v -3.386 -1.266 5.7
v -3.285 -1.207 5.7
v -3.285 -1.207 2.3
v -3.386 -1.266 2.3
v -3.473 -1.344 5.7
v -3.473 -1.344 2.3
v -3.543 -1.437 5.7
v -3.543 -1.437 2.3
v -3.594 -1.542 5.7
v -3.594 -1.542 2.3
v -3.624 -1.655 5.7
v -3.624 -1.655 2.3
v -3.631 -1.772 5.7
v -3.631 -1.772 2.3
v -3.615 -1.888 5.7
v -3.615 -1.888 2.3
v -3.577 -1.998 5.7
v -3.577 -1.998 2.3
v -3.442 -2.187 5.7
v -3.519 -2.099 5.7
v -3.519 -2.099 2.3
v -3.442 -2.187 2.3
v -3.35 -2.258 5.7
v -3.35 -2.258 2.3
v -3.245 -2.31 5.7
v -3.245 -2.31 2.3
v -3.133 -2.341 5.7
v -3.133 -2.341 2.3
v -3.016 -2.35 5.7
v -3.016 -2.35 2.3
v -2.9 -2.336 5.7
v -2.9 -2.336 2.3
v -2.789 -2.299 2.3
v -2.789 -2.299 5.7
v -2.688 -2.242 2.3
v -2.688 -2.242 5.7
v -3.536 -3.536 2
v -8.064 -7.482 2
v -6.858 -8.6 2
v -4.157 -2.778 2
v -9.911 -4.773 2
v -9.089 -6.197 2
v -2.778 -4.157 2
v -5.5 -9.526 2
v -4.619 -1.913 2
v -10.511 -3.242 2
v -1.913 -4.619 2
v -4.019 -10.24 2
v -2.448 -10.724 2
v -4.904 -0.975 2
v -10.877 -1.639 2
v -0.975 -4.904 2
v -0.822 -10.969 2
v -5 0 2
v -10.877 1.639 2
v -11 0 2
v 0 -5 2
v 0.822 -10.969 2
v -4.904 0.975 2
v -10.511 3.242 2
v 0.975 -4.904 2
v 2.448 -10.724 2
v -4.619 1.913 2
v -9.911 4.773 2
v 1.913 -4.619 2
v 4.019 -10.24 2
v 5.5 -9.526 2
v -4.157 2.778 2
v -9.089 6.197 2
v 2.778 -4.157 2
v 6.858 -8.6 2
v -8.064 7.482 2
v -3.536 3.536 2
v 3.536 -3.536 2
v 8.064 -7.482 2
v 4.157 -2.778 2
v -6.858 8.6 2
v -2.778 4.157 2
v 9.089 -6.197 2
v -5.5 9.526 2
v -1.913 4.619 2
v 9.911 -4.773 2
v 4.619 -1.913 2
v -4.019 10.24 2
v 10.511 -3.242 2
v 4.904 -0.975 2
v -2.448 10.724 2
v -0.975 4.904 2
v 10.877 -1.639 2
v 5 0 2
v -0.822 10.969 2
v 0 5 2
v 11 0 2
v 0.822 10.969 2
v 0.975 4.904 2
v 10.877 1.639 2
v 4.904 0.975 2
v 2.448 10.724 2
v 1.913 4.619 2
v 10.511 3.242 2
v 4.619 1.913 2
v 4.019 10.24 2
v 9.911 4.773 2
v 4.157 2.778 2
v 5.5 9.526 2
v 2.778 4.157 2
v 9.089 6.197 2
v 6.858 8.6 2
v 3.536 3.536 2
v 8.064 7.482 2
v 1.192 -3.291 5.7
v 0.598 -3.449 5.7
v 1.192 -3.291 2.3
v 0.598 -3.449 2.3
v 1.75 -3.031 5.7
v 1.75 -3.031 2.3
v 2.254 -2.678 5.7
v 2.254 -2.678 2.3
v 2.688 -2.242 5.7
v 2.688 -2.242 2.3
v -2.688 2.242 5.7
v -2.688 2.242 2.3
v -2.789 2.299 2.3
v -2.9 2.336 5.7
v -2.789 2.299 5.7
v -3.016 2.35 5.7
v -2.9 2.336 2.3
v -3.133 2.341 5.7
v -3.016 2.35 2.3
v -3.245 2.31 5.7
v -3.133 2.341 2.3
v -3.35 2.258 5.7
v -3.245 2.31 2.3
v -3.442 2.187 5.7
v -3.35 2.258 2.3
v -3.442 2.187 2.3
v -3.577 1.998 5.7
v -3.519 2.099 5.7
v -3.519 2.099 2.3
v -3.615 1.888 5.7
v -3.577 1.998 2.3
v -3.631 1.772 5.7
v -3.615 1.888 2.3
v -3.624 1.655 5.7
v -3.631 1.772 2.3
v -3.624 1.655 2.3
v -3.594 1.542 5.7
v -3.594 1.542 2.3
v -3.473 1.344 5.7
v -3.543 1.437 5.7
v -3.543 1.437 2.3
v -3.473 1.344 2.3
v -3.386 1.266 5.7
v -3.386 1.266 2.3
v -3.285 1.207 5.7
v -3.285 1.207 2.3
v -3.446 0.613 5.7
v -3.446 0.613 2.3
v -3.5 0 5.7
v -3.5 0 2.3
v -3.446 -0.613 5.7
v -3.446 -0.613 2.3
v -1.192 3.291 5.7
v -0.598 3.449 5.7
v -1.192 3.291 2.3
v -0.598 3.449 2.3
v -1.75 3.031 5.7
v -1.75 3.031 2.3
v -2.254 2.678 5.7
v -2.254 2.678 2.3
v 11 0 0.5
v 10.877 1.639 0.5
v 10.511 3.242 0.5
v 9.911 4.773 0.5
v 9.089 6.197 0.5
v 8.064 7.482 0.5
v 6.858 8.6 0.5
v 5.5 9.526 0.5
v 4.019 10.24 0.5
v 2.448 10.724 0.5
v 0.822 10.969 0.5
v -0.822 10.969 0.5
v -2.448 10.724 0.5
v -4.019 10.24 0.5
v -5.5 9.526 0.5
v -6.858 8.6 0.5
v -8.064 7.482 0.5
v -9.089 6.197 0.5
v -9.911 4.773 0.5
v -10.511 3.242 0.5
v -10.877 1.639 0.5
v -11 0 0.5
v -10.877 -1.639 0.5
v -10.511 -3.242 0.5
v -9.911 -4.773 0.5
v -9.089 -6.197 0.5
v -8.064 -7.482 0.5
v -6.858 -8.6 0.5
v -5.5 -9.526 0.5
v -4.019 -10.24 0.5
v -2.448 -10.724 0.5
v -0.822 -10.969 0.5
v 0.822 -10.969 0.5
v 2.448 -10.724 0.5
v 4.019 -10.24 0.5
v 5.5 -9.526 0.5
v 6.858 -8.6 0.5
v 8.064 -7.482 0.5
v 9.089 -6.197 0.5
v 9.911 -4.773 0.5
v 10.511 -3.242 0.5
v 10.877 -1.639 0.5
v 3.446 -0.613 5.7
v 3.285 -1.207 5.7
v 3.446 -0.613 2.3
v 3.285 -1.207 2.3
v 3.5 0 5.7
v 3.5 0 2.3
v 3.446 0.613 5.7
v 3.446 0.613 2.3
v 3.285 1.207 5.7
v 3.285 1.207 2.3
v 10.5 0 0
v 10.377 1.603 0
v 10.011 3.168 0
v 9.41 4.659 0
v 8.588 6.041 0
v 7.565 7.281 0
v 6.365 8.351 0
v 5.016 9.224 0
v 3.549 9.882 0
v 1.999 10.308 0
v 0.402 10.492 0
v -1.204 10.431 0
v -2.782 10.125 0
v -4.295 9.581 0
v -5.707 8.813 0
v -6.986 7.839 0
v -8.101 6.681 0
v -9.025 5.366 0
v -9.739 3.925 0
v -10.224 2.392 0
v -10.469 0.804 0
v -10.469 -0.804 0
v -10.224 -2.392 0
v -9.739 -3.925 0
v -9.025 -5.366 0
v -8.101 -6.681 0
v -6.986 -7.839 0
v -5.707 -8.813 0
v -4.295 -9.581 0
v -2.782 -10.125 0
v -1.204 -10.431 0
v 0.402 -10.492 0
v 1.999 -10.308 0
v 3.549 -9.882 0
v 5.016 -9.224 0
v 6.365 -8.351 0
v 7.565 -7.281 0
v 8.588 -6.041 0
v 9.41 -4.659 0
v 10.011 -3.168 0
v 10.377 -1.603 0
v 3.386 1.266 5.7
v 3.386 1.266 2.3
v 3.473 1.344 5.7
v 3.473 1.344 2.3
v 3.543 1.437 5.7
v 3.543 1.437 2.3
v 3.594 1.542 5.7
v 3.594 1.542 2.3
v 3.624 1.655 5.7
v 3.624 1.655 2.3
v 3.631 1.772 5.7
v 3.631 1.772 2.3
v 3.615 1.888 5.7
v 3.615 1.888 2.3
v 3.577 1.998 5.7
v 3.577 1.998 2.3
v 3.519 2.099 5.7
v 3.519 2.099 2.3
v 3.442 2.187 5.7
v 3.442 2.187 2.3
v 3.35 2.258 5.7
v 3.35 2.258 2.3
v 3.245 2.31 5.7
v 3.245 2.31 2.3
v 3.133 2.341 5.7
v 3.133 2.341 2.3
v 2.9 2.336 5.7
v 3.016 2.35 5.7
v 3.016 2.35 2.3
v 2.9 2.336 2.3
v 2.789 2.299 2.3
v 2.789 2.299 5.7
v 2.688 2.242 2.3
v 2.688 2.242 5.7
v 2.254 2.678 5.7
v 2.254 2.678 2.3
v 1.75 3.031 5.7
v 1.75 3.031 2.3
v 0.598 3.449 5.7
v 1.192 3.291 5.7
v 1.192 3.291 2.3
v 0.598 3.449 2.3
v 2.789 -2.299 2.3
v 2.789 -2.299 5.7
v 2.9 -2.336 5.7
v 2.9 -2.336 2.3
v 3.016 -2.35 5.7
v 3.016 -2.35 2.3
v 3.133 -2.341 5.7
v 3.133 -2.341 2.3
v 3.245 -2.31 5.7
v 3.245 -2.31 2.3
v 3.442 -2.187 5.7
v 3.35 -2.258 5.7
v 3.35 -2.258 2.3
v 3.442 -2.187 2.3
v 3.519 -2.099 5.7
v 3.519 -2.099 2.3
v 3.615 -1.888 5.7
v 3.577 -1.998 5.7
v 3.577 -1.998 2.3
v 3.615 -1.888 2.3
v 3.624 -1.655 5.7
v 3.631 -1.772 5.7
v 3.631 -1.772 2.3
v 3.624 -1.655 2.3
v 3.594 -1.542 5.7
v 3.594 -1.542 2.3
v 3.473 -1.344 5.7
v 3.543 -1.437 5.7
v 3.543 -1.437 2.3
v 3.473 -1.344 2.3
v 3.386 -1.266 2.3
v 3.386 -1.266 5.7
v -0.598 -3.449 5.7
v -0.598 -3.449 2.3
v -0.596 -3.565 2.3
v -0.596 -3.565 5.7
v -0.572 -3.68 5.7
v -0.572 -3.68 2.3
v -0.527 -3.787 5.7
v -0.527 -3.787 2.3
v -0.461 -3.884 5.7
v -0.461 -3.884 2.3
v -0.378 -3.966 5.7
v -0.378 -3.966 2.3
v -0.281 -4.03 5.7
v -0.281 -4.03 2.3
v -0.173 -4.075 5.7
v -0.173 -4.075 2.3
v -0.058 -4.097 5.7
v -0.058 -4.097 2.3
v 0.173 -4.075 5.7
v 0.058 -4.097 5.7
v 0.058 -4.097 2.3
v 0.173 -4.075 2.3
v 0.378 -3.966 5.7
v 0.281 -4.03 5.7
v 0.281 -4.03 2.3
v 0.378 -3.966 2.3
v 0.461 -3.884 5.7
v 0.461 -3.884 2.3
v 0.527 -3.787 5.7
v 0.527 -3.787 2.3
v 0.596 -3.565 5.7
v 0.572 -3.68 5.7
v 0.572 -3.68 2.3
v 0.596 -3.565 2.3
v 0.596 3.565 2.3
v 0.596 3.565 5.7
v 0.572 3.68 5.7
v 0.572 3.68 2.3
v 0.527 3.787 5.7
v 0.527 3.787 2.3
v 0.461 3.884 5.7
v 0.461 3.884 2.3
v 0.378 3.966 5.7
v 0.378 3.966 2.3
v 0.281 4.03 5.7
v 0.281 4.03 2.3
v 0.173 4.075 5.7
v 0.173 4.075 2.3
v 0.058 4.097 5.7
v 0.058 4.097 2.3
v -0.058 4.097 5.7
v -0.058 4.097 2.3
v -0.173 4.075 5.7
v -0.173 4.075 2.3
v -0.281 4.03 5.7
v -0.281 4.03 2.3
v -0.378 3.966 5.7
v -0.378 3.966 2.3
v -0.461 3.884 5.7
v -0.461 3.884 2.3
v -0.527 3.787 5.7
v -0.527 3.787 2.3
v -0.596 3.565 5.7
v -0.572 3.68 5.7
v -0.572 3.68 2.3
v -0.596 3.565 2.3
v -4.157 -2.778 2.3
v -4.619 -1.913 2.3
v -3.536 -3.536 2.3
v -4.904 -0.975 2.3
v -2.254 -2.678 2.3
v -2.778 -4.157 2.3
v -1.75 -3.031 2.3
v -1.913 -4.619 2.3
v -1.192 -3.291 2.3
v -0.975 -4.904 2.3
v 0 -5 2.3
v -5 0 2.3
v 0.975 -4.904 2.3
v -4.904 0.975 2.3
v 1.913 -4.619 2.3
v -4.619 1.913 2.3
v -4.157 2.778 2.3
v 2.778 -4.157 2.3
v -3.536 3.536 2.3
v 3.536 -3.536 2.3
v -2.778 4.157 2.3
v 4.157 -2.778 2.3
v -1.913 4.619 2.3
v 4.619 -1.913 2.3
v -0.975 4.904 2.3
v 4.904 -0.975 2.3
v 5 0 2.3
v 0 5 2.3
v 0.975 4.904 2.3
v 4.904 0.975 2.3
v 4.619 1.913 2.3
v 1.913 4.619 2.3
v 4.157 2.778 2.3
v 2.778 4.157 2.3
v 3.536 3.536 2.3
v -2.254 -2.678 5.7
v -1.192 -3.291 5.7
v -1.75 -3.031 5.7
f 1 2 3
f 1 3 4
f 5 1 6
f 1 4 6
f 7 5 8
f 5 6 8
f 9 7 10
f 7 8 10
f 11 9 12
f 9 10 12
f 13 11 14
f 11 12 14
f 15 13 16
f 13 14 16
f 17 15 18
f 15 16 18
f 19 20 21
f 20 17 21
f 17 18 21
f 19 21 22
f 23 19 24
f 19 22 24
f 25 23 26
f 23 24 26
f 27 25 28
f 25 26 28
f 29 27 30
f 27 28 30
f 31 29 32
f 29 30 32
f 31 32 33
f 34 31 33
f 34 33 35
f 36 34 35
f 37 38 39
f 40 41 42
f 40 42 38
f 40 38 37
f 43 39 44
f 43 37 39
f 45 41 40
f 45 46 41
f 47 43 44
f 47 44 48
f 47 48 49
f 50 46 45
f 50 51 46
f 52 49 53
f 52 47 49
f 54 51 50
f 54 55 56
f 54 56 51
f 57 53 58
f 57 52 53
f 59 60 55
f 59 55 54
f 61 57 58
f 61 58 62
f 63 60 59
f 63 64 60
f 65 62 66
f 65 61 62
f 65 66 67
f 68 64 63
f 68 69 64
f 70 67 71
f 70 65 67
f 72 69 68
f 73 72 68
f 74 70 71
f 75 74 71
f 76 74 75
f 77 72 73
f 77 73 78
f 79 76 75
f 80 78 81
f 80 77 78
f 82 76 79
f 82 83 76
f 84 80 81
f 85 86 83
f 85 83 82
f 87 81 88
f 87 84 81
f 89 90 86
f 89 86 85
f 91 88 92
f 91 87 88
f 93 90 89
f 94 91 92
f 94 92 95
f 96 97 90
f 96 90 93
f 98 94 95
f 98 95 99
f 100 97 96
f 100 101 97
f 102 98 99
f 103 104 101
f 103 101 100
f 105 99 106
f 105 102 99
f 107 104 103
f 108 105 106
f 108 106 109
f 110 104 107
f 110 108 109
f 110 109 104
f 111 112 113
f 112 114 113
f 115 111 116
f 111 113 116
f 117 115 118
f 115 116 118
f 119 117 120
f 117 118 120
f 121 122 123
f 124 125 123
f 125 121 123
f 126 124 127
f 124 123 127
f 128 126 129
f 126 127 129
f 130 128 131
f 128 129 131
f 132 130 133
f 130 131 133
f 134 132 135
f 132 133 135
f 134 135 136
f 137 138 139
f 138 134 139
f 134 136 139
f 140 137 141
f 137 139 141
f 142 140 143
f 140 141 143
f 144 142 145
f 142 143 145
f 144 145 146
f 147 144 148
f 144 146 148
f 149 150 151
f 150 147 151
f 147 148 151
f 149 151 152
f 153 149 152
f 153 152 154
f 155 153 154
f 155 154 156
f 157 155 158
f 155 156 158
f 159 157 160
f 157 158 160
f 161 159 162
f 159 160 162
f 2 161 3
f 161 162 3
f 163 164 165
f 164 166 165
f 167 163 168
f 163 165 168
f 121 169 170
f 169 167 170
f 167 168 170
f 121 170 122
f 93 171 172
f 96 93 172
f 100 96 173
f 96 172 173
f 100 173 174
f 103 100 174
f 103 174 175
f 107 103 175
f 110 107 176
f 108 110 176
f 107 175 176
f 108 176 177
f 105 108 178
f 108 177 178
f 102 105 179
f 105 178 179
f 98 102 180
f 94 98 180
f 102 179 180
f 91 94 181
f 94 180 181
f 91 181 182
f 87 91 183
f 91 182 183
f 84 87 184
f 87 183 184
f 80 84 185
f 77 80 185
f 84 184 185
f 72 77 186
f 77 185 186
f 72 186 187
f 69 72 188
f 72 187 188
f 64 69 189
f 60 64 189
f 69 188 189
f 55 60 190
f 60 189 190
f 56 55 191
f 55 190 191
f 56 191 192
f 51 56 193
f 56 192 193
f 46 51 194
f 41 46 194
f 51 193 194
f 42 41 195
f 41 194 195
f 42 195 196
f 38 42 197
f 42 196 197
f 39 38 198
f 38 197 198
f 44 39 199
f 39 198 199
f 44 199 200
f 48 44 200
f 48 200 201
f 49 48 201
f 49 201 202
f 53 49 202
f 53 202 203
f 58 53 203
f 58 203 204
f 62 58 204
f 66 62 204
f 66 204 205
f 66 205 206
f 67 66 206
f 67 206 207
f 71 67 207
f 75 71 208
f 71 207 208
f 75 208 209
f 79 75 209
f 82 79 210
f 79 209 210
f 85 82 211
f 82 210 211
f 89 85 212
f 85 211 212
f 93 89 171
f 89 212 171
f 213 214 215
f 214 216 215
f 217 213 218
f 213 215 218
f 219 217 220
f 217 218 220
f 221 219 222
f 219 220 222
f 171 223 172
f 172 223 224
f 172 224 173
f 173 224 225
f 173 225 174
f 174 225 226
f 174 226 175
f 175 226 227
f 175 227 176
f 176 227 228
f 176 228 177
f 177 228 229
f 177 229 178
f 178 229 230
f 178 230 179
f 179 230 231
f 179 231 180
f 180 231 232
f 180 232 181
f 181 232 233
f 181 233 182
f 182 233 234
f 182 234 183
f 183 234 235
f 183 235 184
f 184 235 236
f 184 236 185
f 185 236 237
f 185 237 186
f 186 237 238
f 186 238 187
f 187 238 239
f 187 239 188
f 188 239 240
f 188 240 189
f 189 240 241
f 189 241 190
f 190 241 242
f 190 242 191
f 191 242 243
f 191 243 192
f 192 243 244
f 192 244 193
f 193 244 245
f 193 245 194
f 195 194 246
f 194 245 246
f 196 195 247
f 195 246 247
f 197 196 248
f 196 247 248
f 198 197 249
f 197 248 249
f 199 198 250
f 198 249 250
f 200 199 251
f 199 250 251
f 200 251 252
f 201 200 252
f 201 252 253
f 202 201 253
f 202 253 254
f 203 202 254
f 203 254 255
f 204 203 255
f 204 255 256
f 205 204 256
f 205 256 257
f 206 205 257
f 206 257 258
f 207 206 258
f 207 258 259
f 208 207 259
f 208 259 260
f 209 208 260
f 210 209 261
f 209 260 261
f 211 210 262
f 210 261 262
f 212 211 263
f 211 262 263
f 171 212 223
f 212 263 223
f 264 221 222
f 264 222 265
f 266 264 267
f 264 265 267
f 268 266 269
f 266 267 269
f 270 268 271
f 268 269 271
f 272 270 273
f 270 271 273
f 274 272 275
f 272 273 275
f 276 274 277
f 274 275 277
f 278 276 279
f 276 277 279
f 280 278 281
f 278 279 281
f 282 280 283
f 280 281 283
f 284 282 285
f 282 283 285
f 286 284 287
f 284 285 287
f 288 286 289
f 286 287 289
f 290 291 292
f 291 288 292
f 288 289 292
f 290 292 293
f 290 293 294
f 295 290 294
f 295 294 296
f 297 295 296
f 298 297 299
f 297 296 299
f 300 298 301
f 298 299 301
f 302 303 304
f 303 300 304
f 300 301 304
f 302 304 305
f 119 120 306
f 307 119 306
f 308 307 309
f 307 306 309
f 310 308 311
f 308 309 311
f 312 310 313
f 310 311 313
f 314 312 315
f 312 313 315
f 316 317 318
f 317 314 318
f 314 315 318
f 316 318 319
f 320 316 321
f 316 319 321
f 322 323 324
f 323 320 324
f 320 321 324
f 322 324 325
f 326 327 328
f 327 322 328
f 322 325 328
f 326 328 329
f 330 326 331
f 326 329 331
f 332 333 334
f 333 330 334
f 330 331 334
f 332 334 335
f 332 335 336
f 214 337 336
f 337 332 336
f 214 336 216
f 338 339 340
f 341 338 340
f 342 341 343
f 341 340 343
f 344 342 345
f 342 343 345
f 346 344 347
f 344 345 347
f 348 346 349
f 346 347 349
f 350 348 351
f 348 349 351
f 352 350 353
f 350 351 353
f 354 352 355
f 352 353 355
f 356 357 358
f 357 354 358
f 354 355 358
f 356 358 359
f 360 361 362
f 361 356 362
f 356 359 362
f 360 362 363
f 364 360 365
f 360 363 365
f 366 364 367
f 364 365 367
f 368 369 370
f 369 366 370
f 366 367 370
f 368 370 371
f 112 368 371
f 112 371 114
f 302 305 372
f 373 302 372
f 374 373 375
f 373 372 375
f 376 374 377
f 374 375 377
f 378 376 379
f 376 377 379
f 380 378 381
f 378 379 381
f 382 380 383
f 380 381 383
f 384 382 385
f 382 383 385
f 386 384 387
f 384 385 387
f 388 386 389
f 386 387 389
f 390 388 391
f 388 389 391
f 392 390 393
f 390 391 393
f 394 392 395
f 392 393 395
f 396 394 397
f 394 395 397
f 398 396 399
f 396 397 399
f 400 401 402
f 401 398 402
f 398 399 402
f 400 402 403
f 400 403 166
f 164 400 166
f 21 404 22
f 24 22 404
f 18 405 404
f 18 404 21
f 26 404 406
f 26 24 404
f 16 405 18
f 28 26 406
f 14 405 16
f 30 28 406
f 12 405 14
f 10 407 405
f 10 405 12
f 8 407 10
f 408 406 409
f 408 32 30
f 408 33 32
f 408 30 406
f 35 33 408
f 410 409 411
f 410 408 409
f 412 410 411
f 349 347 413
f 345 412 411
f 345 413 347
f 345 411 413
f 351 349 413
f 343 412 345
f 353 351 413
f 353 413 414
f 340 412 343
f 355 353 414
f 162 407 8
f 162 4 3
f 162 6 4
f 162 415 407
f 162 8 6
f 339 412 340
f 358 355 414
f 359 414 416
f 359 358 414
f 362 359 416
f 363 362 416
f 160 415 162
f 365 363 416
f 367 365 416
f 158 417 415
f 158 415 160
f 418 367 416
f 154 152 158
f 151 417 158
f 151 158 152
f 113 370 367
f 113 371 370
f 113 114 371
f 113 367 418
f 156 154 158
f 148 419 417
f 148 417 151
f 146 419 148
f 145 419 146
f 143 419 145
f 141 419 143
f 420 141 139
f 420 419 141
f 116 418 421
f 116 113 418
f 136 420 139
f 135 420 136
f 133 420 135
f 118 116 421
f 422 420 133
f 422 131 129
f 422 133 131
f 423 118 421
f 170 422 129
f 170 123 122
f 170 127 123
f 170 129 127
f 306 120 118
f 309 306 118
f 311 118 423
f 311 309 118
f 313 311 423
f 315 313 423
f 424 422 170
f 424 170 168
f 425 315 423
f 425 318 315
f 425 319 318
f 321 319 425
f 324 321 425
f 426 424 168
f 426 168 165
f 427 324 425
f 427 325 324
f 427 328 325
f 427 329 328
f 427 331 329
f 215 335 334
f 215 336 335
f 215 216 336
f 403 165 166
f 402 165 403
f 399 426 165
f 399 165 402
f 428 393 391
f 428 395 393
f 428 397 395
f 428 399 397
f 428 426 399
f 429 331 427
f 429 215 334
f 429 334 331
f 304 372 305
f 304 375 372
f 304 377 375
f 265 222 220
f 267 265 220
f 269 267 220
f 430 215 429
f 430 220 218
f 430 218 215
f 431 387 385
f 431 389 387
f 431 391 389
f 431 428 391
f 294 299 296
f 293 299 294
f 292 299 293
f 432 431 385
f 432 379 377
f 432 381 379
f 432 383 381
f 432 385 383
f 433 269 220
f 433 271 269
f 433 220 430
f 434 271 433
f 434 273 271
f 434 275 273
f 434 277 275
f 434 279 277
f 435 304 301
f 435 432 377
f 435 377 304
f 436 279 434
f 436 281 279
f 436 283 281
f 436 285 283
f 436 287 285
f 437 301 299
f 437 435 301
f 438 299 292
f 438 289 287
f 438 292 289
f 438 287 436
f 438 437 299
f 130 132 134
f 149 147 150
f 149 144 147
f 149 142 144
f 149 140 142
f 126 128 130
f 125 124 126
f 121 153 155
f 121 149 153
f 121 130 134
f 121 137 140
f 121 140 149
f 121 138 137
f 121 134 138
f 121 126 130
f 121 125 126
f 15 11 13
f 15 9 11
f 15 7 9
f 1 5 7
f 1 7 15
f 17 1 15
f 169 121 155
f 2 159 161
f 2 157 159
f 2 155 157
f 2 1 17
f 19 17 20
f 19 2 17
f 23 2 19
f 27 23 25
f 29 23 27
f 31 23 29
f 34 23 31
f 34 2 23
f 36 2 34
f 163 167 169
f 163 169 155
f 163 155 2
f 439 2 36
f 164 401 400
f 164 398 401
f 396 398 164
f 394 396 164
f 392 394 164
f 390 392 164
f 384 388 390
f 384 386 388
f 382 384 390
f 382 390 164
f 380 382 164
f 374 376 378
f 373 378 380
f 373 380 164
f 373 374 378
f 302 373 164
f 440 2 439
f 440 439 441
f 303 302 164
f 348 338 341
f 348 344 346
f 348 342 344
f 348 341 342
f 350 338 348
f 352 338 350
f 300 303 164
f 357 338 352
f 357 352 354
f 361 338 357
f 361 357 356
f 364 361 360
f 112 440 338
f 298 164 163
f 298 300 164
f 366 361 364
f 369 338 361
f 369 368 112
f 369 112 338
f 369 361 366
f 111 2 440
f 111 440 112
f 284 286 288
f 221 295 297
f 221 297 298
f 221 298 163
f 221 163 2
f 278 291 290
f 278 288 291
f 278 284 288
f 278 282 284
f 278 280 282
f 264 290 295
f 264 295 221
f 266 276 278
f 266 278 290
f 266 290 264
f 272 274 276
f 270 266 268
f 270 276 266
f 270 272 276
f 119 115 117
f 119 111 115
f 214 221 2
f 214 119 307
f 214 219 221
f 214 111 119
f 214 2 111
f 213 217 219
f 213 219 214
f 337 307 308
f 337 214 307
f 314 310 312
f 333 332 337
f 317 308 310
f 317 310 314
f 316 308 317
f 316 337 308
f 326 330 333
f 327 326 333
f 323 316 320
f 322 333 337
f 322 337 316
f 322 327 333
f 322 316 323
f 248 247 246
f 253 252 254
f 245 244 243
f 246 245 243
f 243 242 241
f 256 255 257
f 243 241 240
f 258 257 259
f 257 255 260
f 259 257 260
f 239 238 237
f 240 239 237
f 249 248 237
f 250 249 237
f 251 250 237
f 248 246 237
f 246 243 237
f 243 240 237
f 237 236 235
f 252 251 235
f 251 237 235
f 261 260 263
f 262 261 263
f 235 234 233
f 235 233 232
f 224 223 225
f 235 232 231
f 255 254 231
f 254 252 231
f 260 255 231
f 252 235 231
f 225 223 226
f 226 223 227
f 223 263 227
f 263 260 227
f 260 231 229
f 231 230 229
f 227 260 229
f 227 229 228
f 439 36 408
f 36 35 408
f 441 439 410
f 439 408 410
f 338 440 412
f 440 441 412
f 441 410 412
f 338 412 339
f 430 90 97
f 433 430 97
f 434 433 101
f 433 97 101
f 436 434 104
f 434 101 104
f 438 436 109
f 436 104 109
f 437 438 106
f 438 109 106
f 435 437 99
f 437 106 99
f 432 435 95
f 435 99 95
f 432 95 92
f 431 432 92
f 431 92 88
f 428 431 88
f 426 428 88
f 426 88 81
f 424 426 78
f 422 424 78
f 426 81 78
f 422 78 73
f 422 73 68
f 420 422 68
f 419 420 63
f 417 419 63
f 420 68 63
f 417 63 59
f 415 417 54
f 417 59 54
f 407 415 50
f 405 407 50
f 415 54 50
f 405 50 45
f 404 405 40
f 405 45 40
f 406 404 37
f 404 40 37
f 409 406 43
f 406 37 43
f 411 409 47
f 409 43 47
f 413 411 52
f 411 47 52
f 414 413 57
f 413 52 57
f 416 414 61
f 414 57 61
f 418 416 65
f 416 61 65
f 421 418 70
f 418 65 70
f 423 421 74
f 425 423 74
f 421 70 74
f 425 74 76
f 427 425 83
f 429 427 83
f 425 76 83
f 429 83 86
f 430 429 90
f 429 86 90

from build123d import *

# Parameters (mm, degrees)
SKETCH_R           = 11
PAD_DEPTH          = 2
CHAMFER_SIZE       = 0.5
SKETCH001_R        = 5
PAD001_DEPTH       = 0.3
SKETCH002_R        = 3.5
PAD002_DEPTH       = 3.4
SKETCH003_R        = 0.6
PAD003_DEPTH       = 3.4
POLARPATTERN_COUNT = 6


with BuildPart() as part:
    # Sketch → Pad (new body)
    with BuildSketch(Plane.XY):
        Circle(SKETCH_R)
    extrude(amount=PAD_DEPTH)

    # Chamfer
    chamfer_edges = [part.edges().sort_by_distance(p)[0] for p in [
        (-11, 0, 0),
    ]]
    chamfer(chamfer_edges, length=CHAMFER_SIZE)

    # Sketch001 → Pad001 (new body)
    with BuildSketch(Plane.XY.offset(2)):
        Circle(SKETCH001_R)
    extrude(amount=PAD001_DEPTH)

    # Sketch002 → Pad002 (new body)
    with BuildSketch(Plane.XY.offset(2.3)):
        Circle(SKETCH002_R)
    extrude(amount=PAD002_DEPTH)

    # Sketch003 → Pad003 (new body)
    with BuildSketch(Plane.XY.offset(2.3)):
        with Locations((0, 3.5)):
            Circle(SKETCH003_R)
    pad003 = extrude(amount=PAD003_DEPTH)

    # PolarPattern: Pad003 ×6 about axis
    polarpattern_axis = Axis((0, 0, 2.3), (0, 0, 1))
    for i in range(1, POLARPATTERN_COUNT):
        add(pad003.rotate(polarpattern_axis, i * 360 / POLARPATTERN_COUNT))


solid = part.part
